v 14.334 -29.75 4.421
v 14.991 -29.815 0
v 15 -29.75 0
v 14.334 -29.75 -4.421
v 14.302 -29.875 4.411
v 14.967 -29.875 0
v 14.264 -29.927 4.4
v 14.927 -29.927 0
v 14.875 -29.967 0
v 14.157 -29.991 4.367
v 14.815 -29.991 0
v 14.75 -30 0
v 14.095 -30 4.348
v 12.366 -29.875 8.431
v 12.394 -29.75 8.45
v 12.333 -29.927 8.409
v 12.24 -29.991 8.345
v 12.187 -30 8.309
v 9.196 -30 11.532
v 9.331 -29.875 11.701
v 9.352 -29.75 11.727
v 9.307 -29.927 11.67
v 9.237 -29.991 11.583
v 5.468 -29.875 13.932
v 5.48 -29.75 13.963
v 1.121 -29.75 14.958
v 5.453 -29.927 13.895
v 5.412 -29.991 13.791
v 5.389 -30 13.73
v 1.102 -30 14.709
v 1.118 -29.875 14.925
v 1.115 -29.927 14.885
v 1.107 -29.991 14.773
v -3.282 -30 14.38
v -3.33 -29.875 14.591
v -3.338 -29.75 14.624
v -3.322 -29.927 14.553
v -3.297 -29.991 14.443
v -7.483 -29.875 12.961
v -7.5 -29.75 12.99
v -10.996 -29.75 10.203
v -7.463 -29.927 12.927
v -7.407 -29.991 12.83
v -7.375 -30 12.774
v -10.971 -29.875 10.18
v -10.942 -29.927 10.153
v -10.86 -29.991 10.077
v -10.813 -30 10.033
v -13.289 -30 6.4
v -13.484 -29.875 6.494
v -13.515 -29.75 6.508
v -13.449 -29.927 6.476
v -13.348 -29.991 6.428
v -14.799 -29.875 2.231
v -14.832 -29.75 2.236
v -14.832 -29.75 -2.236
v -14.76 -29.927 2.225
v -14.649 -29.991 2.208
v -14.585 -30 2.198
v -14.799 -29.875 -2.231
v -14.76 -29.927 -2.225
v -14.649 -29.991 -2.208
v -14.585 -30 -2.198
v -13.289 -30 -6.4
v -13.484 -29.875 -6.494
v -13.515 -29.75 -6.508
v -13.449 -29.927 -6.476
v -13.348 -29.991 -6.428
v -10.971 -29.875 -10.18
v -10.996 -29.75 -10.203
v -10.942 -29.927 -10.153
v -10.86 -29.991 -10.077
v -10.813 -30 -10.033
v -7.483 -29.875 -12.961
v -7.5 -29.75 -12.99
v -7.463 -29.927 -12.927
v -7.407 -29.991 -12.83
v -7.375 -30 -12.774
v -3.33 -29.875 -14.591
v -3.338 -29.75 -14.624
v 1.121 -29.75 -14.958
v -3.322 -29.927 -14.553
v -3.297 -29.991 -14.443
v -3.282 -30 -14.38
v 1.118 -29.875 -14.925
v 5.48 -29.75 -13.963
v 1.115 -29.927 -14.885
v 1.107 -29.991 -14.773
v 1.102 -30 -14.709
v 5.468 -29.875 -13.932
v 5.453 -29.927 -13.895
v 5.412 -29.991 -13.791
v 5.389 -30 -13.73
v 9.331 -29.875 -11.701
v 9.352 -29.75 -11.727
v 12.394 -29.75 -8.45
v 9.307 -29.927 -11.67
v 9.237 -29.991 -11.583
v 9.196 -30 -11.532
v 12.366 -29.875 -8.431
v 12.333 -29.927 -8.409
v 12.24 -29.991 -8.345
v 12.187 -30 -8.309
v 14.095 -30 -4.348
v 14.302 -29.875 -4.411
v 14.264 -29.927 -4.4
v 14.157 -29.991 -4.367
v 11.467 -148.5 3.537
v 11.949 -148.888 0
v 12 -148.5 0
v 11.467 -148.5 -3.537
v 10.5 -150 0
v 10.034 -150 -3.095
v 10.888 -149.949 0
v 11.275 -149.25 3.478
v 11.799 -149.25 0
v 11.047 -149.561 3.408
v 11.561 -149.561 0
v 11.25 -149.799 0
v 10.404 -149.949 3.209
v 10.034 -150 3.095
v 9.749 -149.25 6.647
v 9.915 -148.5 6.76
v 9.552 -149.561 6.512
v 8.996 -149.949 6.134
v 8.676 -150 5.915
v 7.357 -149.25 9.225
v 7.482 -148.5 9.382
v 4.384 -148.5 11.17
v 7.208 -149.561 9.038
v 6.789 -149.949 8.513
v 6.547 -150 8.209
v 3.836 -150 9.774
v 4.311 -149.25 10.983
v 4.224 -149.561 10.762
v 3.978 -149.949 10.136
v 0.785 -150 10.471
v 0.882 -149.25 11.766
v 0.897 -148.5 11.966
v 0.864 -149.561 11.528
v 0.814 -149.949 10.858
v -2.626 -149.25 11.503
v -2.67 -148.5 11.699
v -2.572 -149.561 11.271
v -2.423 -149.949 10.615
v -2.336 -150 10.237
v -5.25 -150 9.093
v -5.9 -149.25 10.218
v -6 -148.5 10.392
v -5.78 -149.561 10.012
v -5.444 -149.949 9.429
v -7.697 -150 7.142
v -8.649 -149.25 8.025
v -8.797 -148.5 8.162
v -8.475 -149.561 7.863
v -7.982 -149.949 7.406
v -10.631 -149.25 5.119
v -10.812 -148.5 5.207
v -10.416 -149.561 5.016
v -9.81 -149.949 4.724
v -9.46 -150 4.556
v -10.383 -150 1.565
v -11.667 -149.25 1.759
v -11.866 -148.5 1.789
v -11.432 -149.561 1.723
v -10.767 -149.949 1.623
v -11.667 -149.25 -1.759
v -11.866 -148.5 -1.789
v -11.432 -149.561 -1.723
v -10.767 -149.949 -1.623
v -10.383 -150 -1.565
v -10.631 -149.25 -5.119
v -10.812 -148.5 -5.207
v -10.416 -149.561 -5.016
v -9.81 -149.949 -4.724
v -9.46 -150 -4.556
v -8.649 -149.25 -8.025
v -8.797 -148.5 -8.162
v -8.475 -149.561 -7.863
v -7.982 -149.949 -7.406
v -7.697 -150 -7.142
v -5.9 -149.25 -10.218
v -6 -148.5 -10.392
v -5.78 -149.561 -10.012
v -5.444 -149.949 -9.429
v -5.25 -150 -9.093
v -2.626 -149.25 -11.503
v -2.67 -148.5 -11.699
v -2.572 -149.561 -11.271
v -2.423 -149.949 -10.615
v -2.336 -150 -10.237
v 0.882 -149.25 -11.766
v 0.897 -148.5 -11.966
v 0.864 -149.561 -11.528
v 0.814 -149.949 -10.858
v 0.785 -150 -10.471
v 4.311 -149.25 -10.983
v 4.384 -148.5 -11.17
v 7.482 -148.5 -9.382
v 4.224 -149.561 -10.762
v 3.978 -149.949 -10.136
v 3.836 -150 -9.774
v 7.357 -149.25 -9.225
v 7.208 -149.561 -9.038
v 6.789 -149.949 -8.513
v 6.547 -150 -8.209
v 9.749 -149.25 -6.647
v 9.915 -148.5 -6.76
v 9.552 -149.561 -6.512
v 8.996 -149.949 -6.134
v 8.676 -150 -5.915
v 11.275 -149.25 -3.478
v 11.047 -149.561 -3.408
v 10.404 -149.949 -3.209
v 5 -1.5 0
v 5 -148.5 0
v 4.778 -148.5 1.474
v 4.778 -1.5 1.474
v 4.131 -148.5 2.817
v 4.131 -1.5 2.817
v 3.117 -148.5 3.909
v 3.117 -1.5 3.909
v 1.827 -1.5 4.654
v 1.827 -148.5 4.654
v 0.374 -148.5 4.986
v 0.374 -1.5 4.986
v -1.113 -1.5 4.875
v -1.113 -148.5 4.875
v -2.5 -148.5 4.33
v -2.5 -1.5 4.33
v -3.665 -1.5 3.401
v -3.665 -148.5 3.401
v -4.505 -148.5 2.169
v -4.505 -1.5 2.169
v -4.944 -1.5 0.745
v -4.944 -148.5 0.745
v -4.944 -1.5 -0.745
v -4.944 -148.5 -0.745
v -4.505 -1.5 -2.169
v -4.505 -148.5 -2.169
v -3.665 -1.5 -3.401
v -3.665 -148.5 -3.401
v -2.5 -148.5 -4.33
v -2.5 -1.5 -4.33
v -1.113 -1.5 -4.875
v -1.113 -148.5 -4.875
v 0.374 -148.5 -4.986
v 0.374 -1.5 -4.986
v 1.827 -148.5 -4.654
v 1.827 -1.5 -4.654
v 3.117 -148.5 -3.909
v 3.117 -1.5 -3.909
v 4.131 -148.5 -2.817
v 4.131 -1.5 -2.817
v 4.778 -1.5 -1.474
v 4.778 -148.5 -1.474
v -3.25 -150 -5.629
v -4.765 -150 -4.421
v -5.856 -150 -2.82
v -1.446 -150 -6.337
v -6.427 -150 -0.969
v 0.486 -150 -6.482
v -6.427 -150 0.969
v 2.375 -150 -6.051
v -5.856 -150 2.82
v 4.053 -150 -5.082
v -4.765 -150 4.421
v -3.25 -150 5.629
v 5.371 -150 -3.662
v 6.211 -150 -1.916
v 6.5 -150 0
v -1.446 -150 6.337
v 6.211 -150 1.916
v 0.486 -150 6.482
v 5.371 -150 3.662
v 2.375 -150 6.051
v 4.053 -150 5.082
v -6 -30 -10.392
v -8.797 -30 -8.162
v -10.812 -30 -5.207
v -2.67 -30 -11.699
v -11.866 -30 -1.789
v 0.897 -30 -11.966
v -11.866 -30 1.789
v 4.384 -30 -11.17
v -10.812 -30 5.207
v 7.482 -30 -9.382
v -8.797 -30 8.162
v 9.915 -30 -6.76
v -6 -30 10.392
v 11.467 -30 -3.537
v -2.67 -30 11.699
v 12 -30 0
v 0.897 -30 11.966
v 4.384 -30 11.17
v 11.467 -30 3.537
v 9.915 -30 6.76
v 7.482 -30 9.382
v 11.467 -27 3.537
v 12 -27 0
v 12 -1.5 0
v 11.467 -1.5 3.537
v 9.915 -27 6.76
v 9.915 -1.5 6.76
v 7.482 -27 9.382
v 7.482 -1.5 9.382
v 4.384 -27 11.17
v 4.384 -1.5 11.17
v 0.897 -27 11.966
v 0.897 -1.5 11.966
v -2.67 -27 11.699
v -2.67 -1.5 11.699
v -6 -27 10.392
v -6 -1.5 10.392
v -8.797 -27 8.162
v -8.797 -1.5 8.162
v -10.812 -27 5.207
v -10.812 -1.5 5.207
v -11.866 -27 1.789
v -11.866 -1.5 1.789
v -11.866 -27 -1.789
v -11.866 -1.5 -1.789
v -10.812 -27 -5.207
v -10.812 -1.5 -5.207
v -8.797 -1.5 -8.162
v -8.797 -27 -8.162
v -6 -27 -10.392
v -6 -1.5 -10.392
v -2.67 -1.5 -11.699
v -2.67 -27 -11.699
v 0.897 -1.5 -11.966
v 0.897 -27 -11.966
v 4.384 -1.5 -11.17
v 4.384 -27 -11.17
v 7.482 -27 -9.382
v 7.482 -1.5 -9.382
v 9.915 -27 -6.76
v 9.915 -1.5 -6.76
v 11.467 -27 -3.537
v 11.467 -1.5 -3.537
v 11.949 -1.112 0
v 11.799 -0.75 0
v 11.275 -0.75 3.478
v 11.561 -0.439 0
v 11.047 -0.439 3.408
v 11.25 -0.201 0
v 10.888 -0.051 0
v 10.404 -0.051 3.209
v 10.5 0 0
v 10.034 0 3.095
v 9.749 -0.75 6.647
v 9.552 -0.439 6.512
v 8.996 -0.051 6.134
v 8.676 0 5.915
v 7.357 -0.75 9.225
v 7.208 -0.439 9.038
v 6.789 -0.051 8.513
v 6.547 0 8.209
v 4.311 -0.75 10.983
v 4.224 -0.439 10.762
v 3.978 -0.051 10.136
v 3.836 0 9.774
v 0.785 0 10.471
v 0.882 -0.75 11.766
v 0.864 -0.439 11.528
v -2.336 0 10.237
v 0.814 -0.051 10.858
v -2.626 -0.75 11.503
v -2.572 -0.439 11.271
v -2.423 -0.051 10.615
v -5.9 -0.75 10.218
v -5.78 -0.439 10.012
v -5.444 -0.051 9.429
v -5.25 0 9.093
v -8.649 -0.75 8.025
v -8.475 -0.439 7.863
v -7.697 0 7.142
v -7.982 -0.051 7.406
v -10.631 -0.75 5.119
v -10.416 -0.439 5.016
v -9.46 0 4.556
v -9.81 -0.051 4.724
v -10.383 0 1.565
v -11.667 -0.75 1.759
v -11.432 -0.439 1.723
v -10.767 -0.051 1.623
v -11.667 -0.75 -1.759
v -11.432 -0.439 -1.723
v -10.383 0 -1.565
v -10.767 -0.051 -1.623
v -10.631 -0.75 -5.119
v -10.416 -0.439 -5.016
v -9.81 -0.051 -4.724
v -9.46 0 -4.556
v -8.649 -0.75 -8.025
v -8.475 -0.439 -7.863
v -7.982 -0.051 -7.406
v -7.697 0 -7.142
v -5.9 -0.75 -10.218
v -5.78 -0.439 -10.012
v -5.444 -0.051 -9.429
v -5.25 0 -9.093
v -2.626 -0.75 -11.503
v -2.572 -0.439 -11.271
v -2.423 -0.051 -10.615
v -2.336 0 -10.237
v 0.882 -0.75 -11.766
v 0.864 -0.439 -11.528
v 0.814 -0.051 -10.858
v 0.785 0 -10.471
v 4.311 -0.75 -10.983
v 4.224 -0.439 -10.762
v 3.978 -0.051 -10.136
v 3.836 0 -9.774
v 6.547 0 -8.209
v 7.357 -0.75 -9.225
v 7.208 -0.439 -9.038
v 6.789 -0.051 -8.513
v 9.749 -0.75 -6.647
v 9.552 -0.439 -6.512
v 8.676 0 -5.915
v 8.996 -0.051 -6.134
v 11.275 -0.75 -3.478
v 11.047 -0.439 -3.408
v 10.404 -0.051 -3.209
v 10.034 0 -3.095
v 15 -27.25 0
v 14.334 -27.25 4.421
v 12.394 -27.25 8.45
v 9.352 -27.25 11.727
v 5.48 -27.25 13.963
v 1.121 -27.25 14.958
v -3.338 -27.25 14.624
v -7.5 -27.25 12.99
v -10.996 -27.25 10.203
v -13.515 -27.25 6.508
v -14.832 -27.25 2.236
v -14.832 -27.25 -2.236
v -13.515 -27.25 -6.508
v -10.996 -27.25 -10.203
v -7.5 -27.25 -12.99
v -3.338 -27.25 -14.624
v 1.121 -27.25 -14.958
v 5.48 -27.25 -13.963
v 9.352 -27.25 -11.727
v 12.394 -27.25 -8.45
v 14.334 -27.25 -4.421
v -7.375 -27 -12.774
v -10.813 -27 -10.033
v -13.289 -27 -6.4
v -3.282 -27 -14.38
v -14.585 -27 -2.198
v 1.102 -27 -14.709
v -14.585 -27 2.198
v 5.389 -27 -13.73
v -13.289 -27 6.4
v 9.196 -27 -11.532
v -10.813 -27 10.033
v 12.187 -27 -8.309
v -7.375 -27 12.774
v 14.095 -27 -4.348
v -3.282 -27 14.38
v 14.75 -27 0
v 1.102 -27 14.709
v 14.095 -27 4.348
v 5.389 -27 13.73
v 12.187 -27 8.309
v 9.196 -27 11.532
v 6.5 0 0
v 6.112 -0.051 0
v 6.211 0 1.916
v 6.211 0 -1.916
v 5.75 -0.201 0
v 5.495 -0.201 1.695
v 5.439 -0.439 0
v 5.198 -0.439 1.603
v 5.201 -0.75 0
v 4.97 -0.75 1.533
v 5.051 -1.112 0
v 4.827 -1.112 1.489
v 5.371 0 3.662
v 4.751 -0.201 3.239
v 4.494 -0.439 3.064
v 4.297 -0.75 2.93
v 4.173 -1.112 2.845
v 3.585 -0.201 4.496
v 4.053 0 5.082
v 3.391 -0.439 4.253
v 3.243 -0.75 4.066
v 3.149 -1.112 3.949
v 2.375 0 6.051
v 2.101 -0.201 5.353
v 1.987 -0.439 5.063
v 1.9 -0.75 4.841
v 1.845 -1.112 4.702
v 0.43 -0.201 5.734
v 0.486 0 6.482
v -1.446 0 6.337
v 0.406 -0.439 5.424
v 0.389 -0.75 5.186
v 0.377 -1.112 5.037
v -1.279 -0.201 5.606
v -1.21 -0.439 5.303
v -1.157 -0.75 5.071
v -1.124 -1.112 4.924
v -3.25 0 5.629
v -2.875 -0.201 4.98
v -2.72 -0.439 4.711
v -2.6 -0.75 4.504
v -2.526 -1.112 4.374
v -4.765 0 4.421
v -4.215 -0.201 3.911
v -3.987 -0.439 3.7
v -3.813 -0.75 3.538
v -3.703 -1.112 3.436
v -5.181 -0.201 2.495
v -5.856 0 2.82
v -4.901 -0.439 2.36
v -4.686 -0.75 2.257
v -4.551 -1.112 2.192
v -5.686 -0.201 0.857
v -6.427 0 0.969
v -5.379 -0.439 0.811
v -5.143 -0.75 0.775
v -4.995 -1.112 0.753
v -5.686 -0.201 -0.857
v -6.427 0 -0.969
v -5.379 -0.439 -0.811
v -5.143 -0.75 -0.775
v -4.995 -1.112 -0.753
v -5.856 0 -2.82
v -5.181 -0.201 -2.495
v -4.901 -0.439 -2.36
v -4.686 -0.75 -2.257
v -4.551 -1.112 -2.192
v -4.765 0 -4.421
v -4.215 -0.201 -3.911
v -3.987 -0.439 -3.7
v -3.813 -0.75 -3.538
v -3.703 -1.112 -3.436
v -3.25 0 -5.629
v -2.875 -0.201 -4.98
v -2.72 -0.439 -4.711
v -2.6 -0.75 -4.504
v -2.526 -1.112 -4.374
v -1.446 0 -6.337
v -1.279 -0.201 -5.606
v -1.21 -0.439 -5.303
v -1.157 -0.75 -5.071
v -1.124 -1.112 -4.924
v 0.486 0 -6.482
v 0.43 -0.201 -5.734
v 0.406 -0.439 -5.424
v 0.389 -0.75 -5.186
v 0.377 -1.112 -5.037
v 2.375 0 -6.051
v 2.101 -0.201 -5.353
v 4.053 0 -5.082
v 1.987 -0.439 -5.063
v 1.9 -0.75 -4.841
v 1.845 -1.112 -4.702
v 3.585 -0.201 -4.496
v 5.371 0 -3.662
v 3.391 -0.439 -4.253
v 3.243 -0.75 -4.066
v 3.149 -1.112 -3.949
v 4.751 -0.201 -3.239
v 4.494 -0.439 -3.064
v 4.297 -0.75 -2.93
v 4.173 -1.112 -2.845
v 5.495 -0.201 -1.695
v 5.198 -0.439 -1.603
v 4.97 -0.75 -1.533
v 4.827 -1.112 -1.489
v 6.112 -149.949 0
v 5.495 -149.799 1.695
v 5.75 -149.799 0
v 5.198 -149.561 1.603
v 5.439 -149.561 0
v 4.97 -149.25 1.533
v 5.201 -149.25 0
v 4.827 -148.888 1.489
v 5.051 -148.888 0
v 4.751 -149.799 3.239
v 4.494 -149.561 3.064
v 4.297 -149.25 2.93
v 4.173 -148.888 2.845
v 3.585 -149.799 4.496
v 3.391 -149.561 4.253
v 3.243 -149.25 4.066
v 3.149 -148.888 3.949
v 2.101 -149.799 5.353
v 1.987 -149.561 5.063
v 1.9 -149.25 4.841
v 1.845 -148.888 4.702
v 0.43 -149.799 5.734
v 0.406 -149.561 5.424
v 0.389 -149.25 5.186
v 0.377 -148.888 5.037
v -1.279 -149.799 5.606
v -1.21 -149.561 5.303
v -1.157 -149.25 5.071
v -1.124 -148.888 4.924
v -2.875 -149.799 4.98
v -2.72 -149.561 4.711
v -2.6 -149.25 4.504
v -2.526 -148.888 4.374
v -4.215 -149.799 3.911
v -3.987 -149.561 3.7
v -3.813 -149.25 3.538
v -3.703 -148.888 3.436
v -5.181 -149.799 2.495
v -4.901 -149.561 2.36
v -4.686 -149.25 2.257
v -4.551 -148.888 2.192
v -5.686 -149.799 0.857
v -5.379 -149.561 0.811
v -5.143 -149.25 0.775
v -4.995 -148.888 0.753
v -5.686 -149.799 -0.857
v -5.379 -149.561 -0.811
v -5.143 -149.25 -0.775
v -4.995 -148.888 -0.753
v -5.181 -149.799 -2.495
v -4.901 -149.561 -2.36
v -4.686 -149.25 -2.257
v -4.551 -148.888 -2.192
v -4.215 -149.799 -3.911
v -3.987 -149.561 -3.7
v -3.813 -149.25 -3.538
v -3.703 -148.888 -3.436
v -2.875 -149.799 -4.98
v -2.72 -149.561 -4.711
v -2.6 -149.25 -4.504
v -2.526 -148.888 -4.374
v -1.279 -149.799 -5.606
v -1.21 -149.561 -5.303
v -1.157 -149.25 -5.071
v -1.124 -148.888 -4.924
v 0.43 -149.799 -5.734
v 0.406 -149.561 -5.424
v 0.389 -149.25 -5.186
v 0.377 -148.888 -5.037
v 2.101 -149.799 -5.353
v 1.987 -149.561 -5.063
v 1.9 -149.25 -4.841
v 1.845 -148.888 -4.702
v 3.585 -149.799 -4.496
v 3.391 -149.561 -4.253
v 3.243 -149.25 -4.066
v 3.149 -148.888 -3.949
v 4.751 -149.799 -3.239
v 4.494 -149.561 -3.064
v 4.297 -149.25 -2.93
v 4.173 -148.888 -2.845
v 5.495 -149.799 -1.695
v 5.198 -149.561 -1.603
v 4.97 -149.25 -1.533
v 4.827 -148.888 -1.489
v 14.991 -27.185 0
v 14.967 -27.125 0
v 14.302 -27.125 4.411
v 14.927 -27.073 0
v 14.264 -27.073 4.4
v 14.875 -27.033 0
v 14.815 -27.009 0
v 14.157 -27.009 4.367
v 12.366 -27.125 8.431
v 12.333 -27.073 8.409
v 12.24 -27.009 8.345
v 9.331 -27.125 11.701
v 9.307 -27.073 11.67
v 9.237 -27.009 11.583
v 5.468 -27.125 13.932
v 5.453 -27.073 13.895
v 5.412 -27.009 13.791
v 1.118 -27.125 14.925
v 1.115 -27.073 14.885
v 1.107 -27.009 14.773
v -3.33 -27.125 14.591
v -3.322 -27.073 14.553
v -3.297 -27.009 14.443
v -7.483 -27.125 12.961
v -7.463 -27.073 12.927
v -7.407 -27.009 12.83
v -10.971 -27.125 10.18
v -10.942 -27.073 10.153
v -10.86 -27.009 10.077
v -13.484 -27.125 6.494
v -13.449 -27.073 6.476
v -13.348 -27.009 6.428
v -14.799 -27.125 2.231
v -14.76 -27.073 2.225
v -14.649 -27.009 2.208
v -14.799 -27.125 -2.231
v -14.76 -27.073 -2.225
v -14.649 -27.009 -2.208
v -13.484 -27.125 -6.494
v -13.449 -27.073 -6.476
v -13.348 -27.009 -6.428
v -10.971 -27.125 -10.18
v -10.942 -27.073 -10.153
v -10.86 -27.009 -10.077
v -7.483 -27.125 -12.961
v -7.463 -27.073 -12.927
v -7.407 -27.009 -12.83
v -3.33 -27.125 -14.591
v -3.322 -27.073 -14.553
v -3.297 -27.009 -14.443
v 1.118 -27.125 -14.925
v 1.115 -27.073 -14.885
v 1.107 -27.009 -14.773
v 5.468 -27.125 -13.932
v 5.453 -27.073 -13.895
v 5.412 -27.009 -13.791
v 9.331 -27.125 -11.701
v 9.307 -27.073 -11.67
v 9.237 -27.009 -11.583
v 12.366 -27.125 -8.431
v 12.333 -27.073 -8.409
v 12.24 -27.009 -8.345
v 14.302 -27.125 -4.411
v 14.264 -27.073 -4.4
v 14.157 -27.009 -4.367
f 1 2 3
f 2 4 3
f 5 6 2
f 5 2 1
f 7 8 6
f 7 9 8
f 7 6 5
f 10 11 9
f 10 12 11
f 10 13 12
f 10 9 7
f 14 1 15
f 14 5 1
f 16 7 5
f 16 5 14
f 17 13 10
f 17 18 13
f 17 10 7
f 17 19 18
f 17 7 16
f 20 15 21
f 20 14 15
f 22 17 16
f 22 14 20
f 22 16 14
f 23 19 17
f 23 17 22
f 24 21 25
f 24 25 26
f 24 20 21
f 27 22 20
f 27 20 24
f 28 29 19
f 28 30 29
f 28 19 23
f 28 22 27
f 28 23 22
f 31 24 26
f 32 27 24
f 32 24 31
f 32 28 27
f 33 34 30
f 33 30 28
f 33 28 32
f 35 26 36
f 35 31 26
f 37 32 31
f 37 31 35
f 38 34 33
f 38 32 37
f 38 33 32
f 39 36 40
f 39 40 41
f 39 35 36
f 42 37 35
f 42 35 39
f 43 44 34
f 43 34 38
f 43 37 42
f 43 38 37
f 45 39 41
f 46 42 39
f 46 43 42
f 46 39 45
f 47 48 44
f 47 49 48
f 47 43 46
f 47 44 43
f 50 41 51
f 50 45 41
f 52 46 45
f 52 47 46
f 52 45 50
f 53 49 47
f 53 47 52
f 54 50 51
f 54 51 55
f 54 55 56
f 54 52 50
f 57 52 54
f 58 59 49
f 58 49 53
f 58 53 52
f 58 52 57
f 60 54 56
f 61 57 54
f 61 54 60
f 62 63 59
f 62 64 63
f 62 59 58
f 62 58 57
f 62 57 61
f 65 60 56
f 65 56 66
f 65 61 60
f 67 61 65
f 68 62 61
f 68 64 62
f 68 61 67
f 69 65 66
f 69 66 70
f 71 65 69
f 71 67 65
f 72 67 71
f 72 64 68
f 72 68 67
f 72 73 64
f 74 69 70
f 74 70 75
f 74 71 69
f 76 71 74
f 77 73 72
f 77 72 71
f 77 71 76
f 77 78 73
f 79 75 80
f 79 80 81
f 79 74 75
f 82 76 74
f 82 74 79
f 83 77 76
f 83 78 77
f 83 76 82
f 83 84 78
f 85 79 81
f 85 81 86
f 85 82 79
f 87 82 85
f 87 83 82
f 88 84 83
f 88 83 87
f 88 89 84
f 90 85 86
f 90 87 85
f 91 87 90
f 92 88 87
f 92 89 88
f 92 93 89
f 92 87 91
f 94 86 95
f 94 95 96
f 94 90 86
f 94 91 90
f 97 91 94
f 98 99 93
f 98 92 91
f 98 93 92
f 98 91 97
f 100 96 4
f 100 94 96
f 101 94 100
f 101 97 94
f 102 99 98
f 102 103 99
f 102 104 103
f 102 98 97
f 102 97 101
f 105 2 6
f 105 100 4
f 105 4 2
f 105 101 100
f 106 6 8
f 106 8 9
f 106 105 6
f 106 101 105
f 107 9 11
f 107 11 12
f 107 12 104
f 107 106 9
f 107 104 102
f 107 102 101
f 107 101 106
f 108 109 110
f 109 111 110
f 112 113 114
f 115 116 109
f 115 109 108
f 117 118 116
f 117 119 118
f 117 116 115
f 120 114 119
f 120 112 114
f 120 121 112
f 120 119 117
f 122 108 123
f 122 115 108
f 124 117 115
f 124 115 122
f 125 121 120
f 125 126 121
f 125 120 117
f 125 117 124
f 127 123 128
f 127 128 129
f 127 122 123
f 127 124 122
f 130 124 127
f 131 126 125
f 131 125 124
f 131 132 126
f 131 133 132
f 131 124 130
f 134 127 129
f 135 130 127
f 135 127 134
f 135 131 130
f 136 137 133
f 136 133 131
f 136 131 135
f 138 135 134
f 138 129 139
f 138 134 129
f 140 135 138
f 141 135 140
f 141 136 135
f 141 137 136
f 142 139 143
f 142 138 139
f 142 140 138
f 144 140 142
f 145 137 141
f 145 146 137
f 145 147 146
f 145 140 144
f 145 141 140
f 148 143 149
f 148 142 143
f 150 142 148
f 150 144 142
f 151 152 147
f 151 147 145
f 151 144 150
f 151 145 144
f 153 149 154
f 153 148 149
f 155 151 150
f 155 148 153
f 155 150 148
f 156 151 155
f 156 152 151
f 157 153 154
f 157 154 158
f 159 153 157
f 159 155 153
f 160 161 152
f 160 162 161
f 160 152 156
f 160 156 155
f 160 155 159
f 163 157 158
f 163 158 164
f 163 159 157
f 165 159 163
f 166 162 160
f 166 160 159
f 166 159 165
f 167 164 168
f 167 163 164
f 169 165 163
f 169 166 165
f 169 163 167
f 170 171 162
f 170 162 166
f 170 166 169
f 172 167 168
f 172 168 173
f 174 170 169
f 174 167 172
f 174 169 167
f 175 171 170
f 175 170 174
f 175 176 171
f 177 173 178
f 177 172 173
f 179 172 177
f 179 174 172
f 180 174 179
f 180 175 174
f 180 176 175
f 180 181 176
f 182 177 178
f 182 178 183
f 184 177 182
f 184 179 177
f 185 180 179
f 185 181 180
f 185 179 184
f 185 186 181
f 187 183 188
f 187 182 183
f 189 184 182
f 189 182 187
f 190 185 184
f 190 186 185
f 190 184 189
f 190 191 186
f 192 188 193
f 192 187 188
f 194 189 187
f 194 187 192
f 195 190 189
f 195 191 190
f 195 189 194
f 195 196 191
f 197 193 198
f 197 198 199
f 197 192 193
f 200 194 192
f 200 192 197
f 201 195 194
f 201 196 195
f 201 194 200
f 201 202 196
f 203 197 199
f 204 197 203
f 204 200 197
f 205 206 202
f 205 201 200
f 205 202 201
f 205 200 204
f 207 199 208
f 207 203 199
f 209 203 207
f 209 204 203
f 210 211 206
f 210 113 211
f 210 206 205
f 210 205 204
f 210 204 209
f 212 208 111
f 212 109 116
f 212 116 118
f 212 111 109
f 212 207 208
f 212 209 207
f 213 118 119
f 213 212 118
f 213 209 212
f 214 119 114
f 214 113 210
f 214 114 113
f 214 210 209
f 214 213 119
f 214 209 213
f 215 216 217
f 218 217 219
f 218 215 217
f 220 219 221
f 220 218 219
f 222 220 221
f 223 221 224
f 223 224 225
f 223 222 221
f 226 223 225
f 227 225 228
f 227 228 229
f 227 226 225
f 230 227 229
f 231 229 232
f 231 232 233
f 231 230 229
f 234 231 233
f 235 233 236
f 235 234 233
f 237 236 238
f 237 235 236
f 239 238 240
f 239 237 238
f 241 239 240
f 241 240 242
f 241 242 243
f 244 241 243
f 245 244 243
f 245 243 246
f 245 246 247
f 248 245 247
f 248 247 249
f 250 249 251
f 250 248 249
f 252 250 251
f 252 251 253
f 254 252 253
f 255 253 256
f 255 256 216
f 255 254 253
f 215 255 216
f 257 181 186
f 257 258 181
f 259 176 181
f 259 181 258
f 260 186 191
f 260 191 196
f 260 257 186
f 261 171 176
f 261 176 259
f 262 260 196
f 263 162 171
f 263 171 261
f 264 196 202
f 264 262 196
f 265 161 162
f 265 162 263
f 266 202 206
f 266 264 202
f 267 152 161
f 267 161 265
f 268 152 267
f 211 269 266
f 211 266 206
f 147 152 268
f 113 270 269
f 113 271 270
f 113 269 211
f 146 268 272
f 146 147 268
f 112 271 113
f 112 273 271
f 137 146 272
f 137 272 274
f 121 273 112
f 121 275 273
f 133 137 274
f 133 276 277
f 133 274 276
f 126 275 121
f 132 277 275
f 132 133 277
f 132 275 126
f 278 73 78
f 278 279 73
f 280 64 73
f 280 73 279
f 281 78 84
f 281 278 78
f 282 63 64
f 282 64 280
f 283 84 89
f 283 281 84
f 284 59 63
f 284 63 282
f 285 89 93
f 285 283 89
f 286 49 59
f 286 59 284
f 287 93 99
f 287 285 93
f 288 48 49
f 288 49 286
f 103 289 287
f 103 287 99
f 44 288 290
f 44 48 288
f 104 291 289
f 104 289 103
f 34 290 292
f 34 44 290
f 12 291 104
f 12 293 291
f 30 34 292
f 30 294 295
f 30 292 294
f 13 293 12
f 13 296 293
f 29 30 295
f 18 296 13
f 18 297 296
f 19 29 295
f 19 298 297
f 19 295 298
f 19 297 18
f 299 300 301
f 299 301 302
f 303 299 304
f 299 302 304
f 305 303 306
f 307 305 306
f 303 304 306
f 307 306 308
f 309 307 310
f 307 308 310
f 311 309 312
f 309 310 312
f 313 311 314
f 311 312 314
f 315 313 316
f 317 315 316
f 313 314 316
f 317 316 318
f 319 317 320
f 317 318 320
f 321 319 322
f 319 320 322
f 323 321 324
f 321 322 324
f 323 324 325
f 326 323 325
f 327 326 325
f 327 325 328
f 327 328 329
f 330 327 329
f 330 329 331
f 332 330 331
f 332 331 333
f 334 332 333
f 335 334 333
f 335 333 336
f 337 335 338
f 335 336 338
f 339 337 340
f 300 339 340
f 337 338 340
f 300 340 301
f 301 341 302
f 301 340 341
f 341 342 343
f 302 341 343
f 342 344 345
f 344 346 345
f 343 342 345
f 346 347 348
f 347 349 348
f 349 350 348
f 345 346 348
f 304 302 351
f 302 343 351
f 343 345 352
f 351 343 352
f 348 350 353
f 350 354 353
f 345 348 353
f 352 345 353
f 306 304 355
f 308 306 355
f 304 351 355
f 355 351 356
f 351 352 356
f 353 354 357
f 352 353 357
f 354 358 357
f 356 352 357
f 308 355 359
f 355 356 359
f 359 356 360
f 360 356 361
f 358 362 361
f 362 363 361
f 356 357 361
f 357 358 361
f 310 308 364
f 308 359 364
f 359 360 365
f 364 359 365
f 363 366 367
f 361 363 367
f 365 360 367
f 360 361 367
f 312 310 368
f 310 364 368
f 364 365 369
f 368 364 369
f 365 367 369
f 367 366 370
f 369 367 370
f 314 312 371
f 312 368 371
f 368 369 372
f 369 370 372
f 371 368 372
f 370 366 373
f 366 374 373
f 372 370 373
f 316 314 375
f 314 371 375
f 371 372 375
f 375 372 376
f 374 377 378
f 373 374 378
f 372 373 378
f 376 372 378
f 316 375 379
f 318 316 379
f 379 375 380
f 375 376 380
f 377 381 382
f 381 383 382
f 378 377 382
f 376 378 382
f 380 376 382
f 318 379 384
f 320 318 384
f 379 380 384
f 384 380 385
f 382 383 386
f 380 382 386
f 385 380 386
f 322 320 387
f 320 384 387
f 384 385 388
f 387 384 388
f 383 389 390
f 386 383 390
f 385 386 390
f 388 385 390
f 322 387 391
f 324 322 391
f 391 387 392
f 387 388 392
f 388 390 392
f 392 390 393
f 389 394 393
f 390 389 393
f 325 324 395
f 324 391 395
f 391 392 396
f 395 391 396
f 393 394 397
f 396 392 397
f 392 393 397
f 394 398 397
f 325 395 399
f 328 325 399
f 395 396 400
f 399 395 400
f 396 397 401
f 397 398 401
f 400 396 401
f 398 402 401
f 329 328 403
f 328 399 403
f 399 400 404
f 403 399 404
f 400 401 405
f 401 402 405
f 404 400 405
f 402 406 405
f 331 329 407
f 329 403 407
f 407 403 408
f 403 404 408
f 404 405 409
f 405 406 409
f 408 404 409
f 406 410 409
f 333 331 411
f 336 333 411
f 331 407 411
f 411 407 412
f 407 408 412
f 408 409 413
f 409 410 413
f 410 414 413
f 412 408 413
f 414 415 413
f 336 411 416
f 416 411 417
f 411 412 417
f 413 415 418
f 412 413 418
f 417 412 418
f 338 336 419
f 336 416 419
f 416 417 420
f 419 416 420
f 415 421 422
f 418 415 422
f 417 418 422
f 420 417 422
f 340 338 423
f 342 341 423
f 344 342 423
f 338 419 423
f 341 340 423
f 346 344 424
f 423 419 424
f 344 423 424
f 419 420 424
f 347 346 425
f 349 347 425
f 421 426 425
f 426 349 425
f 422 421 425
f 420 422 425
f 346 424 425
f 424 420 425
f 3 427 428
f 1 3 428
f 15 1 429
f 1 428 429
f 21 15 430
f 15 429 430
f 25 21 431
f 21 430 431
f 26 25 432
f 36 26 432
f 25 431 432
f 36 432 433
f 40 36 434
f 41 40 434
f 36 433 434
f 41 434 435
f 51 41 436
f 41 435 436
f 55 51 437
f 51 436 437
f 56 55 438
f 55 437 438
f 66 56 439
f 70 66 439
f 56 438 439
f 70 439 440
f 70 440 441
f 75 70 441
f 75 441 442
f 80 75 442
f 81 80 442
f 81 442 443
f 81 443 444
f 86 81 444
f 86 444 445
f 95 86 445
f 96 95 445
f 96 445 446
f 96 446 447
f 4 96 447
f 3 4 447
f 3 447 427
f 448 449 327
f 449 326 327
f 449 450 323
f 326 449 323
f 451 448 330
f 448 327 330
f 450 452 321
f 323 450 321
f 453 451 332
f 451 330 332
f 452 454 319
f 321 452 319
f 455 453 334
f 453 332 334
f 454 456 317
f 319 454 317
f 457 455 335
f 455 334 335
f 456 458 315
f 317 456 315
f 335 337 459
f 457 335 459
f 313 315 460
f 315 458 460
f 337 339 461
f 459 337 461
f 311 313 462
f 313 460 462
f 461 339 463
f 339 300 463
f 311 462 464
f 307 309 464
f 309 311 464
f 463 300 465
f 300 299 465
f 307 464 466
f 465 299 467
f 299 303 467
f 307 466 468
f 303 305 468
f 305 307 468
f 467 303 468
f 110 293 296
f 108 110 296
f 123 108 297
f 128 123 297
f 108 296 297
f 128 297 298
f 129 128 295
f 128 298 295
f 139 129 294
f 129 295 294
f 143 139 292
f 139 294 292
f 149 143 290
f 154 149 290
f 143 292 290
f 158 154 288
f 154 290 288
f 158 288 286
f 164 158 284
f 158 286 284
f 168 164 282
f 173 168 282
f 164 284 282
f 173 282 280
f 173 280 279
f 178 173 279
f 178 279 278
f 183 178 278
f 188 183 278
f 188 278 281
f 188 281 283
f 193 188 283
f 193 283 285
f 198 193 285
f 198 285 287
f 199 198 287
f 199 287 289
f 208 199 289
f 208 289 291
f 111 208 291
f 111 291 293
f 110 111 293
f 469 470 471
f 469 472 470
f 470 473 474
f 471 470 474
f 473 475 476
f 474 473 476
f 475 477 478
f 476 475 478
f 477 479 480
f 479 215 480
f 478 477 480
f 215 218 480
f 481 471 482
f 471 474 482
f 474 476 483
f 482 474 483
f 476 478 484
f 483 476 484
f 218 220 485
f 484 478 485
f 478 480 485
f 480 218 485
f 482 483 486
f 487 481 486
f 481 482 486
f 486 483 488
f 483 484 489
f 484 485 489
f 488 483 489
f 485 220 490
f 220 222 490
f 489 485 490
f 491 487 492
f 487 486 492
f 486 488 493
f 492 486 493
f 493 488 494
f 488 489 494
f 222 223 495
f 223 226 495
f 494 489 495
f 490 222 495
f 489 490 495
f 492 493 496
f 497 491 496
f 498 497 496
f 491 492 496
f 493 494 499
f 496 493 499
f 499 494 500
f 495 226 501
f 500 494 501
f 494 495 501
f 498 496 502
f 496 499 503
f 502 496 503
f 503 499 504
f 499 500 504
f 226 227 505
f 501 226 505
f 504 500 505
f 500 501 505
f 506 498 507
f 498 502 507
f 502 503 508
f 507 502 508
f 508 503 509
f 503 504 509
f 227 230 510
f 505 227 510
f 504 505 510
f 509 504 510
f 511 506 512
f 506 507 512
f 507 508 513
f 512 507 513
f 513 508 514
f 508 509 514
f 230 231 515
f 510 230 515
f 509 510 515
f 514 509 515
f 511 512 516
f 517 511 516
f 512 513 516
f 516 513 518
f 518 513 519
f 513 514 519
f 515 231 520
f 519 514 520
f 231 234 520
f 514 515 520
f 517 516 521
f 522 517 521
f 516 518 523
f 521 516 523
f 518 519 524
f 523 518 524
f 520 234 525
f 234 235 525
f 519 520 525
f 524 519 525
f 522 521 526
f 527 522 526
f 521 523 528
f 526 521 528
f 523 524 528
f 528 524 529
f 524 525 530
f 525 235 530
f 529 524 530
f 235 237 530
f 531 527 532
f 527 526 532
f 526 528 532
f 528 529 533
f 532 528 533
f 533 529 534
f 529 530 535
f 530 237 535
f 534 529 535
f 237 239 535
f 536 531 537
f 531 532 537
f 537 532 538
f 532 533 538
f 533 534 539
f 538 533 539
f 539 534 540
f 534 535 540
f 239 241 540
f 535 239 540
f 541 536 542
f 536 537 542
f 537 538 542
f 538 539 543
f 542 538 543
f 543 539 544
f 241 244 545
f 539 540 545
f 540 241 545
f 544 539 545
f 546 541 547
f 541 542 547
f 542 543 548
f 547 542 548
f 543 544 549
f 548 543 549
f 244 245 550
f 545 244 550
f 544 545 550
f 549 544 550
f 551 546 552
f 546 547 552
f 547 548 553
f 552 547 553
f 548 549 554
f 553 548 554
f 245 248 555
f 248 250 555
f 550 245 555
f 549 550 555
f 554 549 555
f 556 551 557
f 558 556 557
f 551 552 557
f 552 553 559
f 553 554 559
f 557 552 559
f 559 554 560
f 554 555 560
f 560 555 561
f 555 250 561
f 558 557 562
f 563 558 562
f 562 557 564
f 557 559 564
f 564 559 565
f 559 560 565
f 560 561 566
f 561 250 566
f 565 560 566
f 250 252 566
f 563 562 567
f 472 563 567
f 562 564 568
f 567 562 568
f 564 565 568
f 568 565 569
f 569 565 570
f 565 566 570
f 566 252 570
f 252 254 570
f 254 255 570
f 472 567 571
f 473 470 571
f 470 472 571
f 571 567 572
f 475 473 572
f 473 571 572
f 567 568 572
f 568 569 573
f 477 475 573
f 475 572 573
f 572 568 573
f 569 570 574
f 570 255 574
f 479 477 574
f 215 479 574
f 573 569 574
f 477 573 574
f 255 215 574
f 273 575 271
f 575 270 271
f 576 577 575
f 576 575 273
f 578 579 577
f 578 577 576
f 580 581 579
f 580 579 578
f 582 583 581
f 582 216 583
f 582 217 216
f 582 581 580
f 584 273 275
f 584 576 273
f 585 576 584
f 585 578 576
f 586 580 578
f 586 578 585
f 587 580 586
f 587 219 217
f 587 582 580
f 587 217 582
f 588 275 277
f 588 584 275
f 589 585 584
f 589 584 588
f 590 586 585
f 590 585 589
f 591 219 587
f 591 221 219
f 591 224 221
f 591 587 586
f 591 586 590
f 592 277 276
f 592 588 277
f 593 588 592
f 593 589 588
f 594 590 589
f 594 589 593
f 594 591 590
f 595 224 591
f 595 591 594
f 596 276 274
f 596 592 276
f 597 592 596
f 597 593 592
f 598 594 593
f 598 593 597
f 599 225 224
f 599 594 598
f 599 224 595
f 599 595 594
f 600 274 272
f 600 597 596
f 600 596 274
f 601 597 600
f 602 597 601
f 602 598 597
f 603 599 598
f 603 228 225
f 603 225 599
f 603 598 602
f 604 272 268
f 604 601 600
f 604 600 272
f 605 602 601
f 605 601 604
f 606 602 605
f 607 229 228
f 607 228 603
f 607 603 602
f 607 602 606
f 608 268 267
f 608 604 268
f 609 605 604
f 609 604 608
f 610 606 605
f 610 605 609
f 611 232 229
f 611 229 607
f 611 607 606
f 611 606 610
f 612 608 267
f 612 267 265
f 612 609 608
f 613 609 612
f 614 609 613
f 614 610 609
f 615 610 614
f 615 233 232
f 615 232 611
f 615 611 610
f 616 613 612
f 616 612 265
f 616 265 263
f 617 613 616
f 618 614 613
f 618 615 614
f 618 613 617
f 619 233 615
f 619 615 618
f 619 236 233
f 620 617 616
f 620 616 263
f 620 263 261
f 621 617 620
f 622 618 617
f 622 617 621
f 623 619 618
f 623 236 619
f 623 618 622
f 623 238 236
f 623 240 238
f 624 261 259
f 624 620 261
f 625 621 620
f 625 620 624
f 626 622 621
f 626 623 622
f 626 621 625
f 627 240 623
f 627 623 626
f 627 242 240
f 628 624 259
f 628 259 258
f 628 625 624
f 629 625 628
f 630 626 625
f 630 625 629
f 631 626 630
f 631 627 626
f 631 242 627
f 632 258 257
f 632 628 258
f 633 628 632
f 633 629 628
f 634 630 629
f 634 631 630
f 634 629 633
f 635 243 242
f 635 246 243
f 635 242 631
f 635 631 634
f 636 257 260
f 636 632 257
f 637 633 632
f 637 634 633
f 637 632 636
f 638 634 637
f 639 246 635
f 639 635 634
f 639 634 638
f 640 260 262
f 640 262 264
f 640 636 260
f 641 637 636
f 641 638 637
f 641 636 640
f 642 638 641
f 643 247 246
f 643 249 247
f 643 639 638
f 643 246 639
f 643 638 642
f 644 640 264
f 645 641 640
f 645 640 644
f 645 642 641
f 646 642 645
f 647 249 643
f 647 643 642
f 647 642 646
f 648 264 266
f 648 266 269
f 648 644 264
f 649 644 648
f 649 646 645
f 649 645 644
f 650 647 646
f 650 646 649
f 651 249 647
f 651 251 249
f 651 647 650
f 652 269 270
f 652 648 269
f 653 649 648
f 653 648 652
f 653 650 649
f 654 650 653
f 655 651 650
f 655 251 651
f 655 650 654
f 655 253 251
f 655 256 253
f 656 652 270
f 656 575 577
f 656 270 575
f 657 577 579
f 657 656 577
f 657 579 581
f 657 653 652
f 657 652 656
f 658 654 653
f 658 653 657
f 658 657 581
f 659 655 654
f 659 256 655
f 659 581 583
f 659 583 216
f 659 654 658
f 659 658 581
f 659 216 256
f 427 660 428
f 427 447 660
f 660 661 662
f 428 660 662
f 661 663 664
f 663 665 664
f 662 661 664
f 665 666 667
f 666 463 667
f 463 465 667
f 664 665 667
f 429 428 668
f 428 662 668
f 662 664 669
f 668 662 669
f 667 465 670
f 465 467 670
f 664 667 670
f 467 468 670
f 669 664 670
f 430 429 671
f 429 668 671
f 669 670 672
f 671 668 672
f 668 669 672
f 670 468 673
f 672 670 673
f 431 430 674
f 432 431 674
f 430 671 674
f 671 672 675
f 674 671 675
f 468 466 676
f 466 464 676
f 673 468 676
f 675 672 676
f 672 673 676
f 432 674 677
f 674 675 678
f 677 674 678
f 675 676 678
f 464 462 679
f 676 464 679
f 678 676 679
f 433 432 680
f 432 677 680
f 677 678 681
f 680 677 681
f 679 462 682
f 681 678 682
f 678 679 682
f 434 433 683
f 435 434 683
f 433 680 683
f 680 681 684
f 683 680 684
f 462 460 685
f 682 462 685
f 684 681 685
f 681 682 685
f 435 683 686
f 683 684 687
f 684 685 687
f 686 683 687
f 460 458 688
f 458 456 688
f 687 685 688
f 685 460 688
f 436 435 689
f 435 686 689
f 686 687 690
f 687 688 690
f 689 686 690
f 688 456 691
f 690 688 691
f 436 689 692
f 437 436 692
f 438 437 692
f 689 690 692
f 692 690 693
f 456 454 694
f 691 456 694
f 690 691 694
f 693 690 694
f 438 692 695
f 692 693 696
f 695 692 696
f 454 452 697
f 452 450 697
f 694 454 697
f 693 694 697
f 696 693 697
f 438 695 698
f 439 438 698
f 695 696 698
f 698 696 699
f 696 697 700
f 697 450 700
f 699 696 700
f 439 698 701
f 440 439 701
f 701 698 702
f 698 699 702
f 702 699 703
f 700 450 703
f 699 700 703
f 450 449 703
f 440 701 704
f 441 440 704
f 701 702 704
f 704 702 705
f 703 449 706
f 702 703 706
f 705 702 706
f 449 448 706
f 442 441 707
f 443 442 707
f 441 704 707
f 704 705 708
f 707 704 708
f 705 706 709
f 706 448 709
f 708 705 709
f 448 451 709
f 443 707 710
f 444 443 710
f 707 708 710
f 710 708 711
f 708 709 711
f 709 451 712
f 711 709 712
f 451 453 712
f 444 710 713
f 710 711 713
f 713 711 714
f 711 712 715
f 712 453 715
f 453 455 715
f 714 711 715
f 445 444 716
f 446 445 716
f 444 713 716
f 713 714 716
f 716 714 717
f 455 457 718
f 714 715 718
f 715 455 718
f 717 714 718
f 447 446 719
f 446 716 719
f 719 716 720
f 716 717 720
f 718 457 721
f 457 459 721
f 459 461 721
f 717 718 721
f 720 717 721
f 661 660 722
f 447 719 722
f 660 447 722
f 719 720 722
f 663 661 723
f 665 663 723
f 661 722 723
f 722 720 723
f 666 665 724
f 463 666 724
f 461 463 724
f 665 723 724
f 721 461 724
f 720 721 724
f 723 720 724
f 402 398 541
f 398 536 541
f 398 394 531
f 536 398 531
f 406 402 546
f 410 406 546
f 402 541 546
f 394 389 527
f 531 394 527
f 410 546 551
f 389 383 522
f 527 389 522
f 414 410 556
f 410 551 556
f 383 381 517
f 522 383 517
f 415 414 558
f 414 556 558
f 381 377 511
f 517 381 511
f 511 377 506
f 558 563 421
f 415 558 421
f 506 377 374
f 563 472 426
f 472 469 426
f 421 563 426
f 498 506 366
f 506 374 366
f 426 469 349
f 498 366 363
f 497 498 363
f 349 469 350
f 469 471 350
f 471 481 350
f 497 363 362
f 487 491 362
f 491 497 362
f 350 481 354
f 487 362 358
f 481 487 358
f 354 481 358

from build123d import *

# Parameters (mm, degrees)
F0_R     = 12
F0_R_2   = 5
F1_DEPTH = 150
F0_R_3   = 15
F2_DEPTH = 30
F3_DEPTH = 27
F4_R     = 0.25
F5_R     = 1.5


with BuildPart() as f1:
    # F0 (on Front) → F1 (new body)
    with BuildSketch(Plane.XZ):
        Circle(F0_R)
        Circle(F0_R_2, mode=Mode.SUBTRACT)
    extrude(amount=F1_DEPTH)

    # F0 (on Front) → F2 (join)
    with BuildSketch(Plane.XZ):
        Circle(F0_R_3)
        Circle(F0_R, mode=Mode.SUBTRACT)
    extrude(amount=F2_DEPTH)

    # F0 (on Front) → F3 (cut)
    with BuildSketch(Plane.XZ):
        Circle(F0_R_3)
        Circle(F0_R, mode=Mode.SUBTRACT)
    extrude(amount=F3_DEPTH, mode=Mode.SUBTRACT)

    # F4
    f4_edges = [f1.edges().sort_by_distance(p)[0] for p in [
        (-15, -30, 0),
        (-15, -27, 0),
    ]]
    fillet(f4_edges, radius=F4_R)

    # F5
    f5_edges = [f1.edges().sort_by_distance(p)[0] for p in [
        (-12, 0, 0),
        (-12, -150, 0),
        (-5, 0, 0),
        (-5, -150, 0),
    ]]
    fillet(f5_edges, radius=F5_R)


solid = f1.part
